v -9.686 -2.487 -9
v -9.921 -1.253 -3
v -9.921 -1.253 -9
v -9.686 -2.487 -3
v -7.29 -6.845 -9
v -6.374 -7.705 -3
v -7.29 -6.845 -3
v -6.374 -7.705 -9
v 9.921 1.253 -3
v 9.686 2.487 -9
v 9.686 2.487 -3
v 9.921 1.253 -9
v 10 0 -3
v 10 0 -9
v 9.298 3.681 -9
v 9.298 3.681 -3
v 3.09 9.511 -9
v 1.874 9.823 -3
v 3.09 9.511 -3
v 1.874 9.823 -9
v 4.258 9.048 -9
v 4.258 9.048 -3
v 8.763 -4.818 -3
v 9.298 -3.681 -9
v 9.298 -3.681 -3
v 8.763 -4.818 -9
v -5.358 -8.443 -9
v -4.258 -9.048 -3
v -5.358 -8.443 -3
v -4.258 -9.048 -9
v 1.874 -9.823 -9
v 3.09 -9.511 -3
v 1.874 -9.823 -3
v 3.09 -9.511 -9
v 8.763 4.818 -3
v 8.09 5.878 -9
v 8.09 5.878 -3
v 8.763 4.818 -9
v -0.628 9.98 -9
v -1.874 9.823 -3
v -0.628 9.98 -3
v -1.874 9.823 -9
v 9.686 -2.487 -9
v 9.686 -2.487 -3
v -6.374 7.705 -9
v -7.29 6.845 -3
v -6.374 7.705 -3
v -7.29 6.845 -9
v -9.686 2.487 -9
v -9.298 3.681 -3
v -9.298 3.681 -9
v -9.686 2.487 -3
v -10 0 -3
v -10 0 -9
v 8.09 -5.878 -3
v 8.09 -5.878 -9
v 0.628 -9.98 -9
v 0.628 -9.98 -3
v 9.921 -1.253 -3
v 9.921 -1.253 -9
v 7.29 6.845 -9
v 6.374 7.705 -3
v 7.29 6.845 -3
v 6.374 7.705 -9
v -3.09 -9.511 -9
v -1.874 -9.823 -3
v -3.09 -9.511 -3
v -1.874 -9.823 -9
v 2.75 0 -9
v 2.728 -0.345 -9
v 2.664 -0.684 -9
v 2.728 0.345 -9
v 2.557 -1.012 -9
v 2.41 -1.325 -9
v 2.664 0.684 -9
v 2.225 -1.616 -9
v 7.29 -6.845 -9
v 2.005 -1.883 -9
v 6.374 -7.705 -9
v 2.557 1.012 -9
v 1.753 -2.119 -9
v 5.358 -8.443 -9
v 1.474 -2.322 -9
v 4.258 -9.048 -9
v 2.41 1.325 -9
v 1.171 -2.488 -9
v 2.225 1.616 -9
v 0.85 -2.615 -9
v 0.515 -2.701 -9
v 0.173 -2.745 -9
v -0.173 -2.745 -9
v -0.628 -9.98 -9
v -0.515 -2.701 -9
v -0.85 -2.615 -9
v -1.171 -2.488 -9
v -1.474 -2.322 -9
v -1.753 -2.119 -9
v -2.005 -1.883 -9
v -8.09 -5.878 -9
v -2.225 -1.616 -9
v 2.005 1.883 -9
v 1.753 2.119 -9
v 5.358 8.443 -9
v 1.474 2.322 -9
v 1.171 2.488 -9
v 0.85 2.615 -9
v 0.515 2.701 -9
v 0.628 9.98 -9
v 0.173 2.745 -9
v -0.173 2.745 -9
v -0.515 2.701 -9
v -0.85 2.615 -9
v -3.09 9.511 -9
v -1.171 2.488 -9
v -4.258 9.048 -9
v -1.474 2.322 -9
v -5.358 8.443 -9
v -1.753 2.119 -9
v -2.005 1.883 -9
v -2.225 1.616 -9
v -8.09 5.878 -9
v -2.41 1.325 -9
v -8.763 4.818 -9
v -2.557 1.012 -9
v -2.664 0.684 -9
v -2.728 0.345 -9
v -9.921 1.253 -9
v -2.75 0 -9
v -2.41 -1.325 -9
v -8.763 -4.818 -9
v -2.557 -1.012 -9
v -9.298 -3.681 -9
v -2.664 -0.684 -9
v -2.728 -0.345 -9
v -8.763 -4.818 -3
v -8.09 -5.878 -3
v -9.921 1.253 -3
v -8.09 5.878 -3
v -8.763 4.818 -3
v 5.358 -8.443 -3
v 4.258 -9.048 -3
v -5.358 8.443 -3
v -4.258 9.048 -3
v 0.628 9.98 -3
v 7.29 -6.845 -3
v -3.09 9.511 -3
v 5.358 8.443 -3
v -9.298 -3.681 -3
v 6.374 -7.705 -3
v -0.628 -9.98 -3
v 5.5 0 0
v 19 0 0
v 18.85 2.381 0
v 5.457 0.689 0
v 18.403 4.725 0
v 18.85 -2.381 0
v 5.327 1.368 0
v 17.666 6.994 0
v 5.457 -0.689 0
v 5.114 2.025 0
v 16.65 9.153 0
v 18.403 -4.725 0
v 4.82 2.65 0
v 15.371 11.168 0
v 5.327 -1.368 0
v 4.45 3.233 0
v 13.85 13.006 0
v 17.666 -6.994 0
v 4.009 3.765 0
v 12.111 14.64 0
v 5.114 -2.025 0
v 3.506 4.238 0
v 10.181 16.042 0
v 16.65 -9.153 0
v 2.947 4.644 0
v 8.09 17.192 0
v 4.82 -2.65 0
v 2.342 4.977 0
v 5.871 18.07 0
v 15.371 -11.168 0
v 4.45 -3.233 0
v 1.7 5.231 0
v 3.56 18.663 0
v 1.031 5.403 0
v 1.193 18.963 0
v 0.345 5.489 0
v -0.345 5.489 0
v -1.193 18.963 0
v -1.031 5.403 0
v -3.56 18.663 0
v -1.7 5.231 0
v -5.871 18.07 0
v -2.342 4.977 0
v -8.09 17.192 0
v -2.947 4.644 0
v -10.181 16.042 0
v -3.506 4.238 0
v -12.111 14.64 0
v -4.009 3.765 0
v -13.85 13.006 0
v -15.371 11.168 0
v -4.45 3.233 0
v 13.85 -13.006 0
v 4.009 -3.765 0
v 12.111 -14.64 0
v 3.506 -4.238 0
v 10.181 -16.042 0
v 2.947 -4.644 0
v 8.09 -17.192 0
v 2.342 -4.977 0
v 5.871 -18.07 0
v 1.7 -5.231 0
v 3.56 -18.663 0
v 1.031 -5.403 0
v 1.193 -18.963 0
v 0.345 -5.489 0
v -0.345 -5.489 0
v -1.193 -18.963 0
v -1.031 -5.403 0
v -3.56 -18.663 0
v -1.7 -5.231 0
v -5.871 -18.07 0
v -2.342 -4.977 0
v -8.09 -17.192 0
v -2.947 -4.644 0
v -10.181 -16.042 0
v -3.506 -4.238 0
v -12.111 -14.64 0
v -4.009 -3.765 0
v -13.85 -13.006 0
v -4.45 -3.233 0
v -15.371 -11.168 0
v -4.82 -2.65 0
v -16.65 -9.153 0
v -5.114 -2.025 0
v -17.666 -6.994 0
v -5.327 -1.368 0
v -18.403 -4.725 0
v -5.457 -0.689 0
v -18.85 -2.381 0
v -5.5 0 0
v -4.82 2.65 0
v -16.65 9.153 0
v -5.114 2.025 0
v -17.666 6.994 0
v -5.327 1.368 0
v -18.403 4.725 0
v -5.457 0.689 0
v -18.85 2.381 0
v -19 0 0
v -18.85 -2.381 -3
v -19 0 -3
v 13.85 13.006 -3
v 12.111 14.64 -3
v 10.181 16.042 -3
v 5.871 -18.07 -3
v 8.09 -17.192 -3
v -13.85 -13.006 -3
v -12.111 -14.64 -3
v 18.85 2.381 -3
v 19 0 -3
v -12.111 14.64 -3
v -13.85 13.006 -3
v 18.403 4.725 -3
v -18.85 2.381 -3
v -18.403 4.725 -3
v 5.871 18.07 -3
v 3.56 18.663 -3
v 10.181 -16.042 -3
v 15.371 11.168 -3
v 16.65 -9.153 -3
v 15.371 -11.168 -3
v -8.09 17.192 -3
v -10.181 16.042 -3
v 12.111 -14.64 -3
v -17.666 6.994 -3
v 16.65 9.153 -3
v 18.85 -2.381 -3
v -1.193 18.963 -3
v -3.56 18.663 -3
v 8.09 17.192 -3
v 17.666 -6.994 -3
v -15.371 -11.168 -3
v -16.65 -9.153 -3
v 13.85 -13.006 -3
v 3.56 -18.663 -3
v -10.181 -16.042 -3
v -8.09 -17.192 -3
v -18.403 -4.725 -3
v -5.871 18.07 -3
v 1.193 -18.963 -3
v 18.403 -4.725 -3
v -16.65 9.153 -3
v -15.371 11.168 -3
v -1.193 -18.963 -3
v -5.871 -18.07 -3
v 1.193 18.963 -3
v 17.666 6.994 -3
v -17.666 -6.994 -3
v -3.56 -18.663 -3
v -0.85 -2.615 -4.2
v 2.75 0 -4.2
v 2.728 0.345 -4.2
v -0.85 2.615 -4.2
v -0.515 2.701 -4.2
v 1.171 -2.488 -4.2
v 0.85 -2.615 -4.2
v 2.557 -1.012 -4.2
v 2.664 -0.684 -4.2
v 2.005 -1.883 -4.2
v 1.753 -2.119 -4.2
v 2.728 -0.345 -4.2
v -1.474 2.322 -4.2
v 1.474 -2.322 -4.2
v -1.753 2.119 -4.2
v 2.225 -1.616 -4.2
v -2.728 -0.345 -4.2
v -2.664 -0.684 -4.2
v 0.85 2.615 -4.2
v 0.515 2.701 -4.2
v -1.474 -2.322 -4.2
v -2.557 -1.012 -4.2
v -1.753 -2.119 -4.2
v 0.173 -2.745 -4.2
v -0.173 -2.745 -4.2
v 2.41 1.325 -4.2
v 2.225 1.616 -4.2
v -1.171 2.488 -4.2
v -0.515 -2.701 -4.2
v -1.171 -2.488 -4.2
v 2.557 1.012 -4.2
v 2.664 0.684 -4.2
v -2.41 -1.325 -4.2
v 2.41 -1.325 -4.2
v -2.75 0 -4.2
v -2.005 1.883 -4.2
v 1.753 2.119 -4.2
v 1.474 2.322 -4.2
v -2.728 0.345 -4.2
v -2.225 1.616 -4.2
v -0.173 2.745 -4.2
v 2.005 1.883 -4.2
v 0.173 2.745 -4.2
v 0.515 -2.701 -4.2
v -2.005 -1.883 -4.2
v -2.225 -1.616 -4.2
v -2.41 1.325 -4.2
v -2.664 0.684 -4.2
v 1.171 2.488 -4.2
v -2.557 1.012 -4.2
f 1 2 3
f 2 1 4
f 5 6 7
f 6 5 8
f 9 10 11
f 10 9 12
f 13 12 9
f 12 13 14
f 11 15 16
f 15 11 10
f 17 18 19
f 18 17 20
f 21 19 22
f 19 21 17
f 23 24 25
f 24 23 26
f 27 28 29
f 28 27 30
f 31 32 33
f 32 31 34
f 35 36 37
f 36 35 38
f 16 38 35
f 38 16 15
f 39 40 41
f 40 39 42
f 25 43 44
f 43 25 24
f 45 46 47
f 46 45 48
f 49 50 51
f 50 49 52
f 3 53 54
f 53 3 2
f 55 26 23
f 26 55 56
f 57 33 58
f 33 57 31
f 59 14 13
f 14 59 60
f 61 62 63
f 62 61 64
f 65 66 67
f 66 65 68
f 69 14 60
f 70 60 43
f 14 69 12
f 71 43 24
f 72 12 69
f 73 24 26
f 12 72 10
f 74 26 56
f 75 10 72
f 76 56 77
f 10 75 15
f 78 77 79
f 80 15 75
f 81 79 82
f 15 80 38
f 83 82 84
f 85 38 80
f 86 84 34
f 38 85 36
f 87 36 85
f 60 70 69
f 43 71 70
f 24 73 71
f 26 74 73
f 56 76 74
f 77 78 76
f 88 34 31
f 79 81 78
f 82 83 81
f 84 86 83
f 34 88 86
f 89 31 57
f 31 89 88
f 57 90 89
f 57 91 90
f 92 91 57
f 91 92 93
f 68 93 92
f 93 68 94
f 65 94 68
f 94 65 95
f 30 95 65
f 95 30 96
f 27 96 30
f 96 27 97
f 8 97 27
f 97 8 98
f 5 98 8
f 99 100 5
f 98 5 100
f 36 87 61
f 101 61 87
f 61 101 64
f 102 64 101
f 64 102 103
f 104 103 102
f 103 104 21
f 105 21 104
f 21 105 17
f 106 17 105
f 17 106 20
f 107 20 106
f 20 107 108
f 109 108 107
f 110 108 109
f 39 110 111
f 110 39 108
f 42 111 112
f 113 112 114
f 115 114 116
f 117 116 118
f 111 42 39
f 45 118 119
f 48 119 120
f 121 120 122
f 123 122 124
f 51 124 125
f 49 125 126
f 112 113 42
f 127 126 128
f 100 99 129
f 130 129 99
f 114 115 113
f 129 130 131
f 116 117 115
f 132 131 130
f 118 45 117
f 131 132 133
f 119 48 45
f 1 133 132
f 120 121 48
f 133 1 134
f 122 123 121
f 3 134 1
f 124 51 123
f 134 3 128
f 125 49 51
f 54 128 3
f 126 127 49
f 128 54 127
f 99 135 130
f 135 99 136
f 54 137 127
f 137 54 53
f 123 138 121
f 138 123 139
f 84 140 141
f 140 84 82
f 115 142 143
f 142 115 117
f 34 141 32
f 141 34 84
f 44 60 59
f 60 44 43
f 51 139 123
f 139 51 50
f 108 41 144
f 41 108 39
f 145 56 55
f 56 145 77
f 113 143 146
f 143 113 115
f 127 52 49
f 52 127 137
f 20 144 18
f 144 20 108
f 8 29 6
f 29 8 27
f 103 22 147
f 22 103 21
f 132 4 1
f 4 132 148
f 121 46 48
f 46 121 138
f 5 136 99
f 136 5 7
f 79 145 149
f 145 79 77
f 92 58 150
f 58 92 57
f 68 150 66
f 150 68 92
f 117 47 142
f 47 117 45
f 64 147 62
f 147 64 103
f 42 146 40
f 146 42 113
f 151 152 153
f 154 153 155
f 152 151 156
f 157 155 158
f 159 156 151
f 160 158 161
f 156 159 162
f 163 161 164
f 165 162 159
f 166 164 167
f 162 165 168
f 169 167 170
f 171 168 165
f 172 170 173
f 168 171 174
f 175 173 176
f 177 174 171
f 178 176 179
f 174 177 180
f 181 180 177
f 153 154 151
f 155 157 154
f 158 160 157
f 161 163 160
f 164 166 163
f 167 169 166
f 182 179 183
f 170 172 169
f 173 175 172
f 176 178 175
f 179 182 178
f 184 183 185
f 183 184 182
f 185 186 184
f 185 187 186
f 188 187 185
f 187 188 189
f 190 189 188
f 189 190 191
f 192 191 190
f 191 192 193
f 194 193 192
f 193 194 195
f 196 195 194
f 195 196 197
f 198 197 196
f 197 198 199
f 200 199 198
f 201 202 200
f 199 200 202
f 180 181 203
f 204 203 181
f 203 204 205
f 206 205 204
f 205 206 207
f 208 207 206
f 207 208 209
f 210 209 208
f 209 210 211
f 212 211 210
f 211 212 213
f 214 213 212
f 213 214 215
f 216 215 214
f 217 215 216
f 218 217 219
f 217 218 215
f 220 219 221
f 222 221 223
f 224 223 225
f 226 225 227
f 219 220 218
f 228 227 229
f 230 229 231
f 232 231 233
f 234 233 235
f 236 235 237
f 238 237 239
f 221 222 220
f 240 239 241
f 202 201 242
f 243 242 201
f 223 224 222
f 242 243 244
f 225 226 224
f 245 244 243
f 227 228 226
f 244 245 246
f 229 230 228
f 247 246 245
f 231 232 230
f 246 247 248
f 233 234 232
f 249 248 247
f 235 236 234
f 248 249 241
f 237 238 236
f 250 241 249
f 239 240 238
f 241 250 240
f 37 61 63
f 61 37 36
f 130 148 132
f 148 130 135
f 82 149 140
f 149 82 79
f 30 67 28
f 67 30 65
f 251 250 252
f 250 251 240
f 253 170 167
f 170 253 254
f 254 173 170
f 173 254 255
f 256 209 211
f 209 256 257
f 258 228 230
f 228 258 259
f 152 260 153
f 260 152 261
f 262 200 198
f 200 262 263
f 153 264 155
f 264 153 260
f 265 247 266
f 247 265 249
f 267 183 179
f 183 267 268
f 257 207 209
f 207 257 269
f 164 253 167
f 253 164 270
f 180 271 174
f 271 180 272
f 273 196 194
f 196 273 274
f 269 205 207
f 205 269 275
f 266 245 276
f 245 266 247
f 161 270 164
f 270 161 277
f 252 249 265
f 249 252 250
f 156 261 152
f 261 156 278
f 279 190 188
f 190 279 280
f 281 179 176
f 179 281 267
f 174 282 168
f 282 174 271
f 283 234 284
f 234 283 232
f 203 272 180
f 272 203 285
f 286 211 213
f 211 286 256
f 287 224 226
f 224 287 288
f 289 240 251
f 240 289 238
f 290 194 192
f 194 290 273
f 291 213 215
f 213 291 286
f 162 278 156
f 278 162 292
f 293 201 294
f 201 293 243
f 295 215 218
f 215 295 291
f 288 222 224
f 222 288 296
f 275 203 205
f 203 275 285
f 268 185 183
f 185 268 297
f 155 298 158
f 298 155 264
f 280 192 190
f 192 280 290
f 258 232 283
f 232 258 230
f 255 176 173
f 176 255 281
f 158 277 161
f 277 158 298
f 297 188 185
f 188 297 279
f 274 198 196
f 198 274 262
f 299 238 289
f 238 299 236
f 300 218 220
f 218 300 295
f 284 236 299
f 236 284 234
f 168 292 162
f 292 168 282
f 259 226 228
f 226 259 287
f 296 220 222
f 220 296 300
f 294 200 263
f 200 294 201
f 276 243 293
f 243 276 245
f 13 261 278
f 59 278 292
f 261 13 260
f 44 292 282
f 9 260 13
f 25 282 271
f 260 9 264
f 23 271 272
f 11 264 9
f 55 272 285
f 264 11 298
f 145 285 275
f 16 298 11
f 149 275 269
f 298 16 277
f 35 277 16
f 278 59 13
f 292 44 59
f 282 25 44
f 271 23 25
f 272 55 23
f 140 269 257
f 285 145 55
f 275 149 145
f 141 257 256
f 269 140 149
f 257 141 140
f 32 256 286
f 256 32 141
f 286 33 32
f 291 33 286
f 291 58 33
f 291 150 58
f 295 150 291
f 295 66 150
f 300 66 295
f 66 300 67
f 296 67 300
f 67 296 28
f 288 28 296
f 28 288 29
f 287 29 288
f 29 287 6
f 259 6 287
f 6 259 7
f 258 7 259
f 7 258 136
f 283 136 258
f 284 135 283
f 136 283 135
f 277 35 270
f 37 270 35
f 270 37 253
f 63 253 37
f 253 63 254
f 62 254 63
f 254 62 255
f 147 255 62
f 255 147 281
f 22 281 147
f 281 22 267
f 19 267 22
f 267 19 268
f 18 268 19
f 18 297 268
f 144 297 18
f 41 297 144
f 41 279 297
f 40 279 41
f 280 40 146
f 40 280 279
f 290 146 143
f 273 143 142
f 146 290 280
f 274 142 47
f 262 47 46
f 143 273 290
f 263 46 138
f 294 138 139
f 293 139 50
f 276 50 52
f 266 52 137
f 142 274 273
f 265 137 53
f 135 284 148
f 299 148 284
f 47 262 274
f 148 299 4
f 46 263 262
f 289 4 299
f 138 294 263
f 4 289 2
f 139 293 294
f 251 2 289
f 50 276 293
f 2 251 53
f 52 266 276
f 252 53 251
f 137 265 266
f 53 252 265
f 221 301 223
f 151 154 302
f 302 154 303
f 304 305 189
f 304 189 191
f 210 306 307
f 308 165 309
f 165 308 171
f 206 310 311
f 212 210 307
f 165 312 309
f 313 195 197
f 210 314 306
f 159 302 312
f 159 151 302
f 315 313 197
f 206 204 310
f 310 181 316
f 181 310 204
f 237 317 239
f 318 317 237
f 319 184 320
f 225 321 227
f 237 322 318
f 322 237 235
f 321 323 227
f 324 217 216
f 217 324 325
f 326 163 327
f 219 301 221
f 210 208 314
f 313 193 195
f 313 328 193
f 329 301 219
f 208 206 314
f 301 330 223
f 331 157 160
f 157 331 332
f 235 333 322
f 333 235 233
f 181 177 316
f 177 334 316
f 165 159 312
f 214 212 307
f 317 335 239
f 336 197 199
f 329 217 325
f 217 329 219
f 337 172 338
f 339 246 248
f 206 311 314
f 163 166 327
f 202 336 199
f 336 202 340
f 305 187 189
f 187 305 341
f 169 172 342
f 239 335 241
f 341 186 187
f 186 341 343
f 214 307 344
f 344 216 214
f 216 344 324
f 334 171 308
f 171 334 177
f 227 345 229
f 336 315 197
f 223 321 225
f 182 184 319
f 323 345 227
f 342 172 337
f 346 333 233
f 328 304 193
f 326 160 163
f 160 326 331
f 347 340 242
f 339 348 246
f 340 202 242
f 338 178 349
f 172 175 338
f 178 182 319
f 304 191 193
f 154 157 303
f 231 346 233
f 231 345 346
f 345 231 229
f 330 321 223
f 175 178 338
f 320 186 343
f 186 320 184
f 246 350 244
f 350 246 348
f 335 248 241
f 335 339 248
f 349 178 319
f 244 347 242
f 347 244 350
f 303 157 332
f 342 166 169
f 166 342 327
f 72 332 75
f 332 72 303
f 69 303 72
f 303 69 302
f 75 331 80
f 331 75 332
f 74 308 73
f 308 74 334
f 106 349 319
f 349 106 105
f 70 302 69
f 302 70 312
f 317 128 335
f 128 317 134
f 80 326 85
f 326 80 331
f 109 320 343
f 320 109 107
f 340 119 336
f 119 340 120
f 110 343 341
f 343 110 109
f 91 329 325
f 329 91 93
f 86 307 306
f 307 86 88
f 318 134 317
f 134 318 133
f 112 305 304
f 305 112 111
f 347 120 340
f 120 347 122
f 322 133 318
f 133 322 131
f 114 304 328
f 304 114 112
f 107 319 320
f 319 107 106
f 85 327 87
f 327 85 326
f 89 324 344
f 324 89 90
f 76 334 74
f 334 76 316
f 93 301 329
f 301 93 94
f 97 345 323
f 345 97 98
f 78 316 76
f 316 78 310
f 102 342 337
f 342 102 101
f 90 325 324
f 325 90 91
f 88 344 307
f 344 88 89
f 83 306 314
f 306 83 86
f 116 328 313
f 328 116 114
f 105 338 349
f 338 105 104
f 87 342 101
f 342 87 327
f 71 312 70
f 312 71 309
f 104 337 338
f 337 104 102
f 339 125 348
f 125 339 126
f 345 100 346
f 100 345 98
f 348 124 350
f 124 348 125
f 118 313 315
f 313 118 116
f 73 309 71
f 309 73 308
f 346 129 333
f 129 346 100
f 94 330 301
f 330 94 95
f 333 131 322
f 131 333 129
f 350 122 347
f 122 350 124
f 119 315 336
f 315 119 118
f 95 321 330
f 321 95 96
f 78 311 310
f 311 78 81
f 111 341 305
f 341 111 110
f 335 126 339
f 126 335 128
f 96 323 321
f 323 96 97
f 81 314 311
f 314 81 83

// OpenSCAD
$fn = 50;


difference() {
	union() {
		translate(v = [0, 0, -9.0000000000]) {
			cylinder(h = 9, r = 10.0000000000);
		}
		translate(v = [0, 0, -3.0000000000]) {
			cylinder(h = 3, r = 19.0000000000);
		}
	}
	union() {
		translate(v = [0, 0, 0]) {
			rotate(a = [0, 0, 0]) {
				difference() {
					union() {
						#translate(v = [0, 0, -9.0000000000]) {
							cylinder(h = 9, r = 2.2500000000);
						}
						#translate(v = [0, 0, -4.2000000000]) {
							cylinder(h = 4.2000000000, r1 = 2.7500000000, r2 = 5.5000000000);
						}
						#translate(v = [0, 0, -9.0000000000]) {
							cylinder(h = 9, r = 2.7500000000);
						}
						#translate(v = [0, 0, -9.0000000000]) {
							cylinder(h = 9, r = 2.2500000000);
						}
					}
					union();
				}
			}
		}
	}
}
